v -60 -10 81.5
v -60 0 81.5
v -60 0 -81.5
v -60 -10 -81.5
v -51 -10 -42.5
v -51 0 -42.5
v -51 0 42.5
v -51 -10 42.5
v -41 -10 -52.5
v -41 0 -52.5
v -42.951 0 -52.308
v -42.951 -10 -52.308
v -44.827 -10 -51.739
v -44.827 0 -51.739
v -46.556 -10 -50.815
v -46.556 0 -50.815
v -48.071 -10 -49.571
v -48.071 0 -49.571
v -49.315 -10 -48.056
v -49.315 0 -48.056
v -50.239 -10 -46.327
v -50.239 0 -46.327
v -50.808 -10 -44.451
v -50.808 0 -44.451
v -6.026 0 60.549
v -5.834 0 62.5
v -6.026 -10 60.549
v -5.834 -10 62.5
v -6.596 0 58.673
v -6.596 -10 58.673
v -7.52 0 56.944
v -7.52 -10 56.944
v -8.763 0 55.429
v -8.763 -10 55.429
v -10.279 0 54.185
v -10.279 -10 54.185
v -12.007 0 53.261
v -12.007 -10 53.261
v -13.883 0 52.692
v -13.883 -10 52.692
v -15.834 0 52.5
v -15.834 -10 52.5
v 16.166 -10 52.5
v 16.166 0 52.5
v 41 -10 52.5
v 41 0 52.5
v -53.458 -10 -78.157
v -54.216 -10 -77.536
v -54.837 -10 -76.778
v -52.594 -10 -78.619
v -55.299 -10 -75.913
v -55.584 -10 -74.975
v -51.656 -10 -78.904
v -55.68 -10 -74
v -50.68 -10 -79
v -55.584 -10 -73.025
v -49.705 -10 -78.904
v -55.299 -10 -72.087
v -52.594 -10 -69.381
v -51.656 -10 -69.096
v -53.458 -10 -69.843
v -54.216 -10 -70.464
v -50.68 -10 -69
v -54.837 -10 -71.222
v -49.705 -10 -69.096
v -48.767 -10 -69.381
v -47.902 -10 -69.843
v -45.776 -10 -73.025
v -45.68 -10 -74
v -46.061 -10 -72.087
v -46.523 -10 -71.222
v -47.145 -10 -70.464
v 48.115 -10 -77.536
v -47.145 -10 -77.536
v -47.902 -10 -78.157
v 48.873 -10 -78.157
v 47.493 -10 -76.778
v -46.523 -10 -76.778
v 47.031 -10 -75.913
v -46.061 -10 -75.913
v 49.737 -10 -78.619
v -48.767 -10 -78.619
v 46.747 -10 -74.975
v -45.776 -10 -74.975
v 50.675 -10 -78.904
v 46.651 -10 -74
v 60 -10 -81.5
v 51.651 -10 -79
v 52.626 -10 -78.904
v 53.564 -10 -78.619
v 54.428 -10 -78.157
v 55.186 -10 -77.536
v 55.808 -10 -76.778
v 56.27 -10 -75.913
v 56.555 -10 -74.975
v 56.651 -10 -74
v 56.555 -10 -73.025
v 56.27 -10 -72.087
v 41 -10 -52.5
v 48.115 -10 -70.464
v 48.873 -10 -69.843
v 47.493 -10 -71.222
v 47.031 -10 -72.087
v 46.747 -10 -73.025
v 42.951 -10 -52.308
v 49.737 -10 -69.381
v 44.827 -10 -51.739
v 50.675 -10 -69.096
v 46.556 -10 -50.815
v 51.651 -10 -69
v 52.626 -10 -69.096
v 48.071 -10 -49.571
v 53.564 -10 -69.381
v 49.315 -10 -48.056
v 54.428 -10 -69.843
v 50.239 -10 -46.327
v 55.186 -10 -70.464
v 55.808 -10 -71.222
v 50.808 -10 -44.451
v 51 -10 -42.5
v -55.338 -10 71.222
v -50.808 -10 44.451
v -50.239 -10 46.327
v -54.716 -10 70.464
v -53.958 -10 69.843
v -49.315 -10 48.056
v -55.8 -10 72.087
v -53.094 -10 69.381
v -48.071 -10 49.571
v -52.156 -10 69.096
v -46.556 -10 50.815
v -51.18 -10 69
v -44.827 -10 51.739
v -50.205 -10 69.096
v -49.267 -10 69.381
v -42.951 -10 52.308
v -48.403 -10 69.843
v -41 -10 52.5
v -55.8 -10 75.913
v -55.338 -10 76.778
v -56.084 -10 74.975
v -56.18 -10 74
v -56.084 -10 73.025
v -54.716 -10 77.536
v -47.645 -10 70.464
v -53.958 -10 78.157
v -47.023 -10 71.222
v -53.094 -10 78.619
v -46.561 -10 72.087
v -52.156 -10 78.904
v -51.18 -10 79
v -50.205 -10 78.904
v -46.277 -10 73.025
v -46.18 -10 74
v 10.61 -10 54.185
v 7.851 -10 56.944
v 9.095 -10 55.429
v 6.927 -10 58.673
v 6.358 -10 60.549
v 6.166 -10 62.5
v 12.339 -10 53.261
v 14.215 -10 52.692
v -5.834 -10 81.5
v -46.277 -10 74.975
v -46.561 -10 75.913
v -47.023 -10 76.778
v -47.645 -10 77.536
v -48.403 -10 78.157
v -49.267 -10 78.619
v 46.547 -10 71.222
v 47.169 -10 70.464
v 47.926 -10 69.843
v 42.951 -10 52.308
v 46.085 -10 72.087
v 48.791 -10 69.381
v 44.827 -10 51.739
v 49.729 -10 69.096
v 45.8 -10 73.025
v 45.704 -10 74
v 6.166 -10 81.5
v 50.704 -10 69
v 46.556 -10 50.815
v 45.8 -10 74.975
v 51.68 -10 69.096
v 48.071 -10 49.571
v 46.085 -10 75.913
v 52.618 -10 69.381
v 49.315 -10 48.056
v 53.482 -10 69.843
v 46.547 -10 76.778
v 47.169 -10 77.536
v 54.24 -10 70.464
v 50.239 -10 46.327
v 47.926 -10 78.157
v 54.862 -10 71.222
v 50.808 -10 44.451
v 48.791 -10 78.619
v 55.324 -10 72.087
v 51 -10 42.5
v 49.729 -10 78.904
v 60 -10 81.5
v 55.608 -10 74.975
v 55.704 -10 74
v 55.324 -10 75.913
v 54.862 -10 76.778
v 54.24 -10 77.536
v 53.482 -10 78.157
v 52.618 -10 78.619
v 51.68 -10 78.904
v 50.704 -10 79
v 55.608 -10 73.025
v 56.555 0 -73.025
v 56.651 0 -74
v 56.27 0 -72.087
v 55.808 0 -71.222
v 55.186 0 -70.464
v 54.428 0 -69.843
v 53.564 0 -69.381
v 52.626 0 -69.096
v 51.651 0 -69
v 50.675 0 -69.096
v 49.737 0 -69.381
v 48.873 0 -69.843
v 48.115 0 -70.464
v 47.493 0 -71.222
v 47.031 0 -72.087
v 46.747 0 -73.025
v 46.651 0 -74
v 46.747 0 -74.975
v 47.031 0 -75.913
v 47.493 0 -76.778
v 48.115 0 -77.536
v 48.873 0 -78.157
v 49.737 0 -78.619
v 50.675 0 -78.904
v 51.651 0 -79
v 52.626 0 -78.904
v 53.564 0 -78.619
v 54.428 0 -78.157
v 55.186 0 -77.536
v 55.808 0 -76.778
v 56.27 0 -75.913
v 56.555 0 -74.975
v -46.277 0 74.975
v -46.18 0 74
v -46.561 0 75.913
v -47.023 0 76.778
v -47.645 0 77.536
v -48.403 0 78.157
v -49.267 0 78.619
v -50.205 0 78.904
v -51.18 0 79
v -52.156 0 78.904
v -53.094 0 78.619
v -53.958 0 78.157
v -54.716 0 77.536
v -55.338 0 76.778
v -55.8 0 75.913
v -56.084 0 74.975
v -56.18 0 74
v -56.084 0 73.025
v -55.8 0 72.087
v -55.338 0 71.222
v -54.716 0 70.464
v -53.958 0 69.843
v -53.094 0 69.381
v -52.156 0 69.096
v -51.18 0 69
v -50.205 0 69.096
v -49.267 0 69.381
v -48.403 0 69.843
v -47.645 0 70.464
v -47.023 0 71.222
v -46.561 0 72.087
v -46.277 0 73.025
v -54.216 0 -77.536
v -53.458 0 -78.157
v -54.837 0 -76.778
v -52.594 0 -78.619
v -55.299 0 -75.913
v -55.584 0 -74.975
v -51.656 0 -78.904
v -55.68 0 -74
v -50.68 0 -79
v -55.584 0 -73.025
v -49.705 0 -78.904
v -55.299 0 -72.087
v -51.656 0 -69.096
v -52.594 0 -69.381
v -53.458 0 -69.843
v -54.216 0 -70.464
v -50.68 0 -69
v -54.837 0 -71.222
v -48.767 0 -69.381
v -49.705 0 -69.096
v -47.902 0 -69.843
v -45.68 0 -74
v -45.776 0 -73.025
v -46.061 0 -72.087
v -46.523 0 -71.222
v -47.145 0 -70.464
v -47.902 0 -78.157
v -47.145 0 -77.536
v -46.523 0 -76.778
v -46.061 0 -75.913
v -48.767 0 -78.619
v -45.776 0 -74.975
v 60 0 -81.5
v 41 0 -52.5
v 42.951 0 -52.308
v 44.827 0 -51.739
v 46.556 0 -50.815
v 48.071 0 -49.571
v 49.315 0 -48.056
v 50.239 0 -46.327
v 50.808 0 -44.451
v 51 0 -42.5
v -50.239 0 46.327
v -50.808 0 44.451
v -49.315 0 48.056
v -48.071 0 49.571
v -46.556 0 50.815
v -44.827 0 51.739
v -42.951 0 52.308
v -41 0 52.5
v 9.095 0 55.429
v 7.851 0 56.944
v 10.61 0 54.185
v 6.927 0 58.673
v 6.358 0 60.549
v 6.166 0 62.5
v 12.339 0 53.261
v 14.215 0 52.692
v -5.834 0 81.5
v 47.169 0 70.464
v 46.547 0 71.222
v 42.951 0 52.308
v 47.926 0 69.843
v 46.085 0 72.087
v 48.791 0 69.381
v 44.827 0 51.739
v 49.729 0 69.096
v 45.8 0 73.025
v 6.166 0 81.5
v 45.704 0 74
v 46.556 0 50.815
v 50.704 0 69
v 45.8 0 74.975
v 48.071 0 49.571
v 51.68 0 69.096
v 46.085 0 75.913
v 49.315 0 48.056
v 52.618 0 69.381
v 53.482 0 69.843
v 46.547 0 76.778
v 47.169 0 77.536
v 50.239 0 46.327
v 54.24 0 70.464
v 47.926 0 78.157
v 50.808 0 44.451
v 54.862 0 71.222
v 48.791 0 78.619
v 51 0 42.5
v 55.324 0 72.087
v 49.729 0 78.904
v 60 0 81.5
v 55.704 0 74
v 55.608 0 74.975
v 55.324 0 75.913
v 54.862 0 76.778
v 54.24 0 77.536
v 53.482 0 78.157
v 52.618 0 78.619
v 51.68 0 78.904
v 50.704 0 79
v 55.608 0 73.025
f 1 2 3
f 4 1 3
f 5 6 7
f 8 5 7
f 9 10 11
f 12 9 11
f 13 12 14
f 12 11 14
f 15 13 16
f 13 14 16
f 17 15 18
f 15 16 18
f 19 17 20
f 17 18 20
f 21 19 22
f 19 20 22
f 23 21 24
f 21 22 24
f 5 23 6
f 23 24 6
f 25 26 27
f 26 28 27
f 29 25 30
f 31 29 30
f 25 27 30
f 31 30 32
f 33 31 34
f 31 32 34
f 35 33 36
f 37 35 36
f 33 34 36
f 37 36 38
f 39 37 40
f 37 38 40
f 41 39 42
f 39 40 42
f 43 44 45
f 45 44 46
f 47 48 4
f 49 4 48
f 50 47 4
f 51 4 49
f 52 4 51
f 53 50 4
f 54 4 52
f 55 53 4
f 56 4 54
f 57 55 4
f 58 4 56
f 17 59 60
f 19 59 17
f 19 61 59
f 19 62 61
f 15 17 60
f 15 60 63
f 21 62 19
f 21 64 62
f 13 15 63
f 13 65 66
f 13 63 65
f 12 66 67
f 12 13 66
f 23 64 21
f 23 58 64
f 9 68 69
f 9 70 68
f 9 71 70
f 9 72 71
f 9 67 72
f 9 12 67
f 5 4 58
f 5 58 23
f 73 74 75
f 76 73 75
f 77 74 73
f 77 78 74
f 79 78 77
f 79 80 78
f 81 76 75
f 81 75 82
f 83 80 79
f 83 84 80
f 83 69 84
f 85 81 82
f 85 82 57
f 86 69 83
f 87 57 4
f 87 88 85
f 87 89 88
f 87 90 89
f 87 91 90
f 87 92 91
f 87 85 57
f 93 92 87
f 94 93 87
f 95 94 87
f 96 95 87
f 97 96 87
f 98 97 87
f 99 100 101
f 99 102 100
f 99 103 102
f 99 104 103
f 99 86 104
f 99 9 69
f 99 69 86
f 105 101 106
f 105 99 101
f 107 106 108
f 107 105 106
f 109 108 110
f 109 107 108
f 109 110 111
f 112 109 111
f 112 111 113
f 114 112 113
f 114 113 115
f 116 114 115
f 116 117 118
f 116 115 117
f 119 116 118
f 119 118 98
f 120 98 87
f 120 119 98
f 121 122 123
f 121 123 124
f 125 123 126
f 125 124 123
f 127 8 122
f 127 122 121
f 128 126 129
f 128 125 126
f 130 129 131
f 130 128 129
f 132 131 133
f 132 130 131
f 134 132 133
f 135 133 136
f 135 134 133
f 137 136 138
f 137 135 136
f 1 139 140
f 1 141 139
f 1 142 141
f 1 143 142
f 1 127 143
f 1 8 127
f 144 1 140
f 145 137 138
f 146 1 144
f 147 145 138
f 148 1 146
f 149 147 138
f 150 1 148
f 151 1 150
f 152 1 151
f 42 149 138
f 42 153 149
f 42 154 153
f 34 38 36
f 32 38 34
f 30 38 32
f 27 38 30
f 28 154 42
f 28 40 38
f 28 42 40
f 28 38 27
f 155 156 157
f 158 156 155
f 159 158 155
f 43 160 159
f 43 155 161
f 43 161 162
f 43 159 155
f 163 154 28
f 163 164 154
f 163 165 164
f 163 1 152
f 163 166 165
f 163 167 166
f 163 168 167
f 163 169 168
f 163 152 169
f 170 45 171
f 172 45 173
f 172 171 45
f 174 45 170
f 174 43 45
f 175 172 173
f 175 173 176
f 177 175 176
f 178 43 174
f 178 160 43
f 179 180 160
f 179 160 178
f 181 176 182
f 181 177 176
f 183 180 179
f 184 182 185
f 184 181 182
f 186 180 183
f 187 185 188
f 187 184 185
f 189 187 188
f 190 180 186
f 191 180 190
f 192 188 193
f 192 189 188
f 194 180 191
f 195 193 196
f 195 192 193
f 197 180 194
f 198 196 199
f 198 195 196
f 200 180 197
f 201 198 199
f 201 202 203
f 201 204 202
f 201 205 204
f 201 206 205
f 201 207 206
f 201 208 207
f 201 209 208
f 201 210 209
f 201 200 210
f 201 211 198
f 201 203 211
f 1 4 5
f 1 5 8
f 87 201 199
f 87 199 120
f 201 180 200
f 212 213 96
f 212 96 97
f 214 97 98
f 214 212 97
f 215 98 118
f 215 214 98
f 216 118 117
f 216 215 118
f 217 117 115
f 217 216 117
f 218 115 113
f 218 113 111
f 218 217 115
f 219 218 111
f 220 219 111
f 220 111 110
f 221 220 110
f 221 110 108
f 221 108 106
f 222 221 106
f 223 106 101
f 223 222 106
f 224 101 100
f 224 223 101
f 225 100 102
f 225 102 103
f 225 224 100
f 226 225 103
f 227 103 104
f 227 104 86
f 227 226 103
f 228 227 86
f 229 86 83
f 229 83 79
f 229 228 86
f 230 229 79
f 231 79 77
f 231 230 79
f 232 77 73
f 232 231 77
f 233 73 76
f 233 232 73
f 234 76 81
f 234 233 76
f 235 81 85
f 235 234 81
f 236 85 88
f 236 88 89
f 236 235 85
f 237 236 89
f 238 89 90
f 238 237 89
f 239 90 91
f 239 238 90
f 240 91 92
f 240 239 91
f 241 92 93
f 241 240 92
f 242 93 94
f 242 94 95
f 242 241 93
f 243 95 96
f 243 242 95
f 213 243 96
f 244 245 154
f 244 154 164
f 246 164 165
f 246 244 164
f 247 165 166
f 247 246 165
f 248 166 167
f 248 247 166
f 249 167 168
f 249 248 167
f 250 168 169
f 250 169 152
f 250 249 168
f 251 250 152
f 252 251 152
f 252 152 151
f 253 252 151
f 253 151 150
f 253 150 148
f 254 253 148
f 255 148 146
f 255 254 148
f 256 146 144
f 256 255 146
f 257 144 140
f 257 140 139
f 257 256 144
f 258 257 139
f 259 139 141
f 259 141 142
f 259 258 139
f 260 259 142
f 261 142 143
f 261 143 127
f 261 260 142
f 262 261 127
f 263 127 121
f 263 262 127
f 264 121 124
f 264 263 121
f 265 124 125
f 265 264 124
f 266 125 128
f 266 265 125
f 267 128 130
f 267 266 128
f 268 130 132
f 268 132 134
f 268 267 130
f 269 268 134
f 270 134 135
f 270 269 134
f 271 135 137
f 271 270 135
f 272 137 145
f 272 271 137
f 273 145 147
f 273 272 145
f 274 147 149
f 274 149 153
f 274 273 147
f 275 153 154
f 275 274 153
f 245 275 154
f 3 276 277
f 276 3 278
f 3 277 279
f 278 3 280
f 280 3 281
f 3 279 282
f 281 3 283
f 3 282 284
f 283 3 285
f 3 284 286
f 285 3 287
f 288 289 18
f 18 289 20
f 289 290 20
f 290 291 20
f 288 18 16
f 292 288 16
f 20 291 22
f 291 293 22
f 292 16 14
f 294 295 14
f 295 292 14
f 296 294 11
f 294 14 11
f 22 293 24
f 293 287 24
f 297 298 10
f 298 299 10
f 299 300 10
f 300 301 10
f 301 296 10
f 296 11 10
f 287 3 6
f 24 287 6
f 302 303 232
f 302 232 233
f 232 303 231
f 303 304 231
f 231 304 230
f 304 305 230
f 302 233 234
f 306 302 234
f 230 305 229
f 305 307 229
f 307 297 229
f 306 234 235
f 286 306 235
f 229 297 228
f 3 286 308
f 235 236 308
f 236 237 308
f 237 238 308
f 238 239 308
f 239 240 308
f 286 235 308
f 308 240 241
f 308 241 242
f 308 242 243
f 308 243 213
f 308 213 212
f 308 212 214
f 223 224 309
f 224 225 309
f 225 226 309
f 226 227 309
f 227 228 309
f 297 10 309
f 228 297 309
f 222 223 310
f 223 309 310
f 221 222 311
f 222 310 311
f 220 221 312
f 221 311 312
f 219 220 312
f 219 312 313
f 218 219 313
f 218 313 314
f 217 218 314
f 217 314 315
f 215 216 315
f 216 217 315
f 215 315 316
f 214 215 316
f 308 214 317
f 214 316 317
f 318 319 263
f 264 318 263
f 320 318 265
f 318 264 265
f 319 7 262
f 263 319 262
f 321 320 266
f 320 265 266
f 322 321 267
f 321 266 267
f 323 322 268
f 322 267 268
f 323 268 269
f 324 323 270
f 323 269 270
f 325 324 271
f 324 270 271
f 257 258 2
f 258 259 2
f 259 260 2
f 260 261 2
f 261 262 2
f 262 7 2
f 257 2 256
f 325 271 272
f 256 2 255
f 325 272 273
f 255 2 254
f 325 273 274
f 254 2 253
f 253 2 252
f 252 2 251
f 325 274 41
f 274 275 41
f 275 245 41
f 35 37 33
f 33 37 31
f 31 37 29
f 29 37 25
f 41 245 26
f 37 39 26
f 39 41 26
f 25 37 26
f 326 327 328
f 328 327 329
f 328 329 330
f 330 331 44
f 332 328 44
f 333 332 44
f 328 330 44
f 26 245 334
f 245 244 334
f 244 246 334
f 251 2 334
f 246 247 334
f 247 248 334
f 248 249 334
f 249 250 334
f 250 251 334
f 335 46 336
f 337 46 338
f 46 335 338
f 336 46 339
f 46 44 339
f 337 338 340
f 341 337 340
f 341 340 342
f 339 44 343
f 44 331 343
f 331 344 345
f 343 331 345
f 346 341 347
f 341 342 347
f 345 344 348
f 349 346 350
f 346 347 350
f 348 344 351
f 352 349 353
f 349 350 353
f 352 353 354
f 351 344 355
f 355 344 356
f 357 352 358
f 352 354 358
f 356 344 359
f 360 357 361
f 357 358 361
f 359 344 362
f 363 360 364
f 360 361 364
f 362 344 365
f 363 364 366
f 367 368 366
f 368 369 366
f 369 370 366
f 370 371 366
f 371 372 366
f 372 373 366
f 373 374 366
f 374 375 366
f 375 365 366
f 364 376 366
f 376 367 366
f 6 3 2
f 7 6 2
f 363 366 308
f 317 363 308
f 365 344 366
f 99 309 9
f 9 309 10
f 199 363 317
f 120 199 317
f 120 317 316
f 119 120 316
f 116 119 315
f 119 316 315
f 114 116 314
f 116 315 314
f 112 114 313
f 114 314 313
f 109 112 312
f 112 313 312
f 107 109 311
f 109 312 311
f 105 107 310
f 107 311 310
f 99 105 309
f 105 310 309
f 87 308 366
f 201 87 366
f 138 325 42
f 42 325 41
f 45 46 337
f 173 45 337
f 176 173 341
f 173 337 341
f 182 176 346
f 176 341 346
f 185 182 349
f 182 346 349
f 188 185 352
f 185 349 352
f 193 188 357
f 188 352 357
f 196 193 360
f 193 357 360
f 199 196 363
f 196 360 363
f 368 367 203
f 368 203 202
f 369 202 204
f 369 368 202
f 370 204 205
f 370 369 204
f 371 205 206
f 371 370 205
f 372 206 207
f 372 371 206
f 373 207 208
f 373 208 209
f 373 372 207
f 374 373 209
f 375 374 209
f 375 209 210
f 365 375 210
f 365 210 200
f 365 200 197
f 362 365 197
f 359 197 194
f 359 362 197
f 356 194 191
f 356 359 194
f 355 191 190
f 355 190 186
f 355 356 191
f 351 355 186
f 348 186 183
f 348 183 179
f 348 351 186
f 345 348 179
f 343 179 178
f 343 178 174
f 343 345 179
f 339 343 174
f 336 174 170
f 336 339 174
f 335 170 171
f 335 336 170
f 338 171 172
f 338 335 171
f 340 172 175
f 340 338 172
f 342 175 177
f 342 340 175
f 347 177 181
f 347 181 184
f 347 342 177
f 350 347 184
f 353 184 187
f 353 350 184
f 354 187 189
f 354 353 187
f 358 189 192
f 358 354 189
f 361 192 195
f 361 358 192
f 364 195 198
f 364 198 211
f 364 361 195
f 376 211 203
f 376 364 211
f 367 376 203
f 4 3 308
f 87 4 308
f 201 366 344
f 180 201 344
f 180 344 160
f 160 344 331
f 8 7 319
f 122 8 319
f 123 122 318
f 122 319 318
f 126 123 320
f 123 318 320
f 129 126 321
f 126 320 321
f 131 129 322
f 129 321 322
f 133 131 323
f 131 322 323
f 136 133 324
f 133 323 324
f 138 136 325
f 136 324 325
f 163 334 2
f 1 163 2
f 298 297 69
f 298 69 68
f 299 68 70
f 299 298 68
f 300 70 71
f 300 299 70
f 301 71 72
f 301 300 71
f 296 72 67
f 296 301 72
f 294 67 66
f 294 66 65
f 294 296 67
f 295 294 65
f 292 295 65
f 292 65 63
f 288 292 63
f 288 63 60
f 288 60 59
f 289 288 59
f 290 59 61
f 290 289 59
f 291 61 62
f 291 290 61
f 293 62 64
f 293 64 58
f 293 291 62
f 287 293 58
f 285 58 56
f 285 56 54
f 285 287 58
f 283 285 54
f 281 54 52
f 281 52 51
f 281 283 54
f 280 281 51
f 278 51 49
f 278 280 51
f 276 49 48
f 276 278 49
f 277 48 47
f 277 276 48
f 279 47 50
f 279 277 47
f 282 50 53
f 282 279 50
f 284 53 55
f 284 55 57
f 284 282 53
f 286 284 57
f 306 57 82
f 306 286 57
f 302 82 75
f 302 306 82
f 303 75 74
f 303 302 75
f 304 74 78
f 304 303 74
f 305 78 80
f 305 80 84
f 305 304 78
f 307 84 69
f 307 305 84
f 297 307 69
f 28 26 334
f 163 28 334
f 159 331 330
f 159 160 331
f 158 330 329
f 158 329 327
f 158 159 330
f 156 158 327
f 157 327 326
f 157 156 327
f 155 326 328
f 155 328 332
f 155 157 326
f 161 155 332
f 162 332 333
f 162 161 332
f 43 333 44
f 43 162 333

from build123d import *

# Parameters (mm, degrees)
F0_R     = 5
F1_DEPTH = 10
F2_R     = 10
F3_R     = 10


with BuildPart() as f1:
    # F0 (on Front) → F1 (new body)
    with BuildSketch(Plane.XZ):
        with BuildLine():
            Line((-60, -81.5), (60, -81.5))
            Line((60, -81.5), (60, 81.5))
            Line((60, 81.5), (6.165685, 81.5))
            Line((6.165685, 81.5), (6.165685, 52.5))
            Line((6.165685, 52.5), (41, 52.5))
            ThreePointArc((41, 52.5), (48.071068, 49.571068), (51, 42.5))
            Line((51, 42.5), (51, -42.5))
            ThreePointArc((51, -42.5), (48.071068, -49.571068), (41, -52.5))
            Line((41, -52.5), (-41, -52.5))
            ThreePointArc((-41, -52.5), (-48.071068, -49.571068), (-51, -42.5))
            Line((-51, -42.5), (-51, 42.5))
            ThreePointArc((-51, 42.5), (-48.071068, 49.571068), (-41, 52.5))
            Line((-41, 52.5), (-5.834315, 52.5))
            Line((-5.834315, 52.5), (-5.834315, 81.5))
            Line((-5.834315, 81.5), (-60, 81.5))
            Line((-60, 81.5), (-60, -81.5))
        make_face()
        with Locations((-50.680101, -74)):
            Circle(F0_R, mode=Mode.SUBTRACT)
        with Locations((51.650584, -74)):
            Circle(F0_R, mode=Mode.SUBTRACT)
        with Locations((-51.180493, 74)):
            Circle(F0_R, mode=Mode.SUBTRACT)
        with Locations((50.704208, 74)):
            Circle(F0_R, mode=Mode.SUBTRACT)
    extrude(amount=F1_DEPTH)

    # F2
    f2_edges = [f1.edges().sort_by_distance(p)[0] for p in [
        (-5.834315, -5, 52.5),
    ]]
    fillet(f2_edges, radius=F2_R)

    # F3
    f3_edges = [f1.edges().sort_by_distance(p)[0] for p in [
        (6.165685, -5, 52.5),
    ]]
    fillet(f3_edges, radius=F3_R)


solid = f1.part
